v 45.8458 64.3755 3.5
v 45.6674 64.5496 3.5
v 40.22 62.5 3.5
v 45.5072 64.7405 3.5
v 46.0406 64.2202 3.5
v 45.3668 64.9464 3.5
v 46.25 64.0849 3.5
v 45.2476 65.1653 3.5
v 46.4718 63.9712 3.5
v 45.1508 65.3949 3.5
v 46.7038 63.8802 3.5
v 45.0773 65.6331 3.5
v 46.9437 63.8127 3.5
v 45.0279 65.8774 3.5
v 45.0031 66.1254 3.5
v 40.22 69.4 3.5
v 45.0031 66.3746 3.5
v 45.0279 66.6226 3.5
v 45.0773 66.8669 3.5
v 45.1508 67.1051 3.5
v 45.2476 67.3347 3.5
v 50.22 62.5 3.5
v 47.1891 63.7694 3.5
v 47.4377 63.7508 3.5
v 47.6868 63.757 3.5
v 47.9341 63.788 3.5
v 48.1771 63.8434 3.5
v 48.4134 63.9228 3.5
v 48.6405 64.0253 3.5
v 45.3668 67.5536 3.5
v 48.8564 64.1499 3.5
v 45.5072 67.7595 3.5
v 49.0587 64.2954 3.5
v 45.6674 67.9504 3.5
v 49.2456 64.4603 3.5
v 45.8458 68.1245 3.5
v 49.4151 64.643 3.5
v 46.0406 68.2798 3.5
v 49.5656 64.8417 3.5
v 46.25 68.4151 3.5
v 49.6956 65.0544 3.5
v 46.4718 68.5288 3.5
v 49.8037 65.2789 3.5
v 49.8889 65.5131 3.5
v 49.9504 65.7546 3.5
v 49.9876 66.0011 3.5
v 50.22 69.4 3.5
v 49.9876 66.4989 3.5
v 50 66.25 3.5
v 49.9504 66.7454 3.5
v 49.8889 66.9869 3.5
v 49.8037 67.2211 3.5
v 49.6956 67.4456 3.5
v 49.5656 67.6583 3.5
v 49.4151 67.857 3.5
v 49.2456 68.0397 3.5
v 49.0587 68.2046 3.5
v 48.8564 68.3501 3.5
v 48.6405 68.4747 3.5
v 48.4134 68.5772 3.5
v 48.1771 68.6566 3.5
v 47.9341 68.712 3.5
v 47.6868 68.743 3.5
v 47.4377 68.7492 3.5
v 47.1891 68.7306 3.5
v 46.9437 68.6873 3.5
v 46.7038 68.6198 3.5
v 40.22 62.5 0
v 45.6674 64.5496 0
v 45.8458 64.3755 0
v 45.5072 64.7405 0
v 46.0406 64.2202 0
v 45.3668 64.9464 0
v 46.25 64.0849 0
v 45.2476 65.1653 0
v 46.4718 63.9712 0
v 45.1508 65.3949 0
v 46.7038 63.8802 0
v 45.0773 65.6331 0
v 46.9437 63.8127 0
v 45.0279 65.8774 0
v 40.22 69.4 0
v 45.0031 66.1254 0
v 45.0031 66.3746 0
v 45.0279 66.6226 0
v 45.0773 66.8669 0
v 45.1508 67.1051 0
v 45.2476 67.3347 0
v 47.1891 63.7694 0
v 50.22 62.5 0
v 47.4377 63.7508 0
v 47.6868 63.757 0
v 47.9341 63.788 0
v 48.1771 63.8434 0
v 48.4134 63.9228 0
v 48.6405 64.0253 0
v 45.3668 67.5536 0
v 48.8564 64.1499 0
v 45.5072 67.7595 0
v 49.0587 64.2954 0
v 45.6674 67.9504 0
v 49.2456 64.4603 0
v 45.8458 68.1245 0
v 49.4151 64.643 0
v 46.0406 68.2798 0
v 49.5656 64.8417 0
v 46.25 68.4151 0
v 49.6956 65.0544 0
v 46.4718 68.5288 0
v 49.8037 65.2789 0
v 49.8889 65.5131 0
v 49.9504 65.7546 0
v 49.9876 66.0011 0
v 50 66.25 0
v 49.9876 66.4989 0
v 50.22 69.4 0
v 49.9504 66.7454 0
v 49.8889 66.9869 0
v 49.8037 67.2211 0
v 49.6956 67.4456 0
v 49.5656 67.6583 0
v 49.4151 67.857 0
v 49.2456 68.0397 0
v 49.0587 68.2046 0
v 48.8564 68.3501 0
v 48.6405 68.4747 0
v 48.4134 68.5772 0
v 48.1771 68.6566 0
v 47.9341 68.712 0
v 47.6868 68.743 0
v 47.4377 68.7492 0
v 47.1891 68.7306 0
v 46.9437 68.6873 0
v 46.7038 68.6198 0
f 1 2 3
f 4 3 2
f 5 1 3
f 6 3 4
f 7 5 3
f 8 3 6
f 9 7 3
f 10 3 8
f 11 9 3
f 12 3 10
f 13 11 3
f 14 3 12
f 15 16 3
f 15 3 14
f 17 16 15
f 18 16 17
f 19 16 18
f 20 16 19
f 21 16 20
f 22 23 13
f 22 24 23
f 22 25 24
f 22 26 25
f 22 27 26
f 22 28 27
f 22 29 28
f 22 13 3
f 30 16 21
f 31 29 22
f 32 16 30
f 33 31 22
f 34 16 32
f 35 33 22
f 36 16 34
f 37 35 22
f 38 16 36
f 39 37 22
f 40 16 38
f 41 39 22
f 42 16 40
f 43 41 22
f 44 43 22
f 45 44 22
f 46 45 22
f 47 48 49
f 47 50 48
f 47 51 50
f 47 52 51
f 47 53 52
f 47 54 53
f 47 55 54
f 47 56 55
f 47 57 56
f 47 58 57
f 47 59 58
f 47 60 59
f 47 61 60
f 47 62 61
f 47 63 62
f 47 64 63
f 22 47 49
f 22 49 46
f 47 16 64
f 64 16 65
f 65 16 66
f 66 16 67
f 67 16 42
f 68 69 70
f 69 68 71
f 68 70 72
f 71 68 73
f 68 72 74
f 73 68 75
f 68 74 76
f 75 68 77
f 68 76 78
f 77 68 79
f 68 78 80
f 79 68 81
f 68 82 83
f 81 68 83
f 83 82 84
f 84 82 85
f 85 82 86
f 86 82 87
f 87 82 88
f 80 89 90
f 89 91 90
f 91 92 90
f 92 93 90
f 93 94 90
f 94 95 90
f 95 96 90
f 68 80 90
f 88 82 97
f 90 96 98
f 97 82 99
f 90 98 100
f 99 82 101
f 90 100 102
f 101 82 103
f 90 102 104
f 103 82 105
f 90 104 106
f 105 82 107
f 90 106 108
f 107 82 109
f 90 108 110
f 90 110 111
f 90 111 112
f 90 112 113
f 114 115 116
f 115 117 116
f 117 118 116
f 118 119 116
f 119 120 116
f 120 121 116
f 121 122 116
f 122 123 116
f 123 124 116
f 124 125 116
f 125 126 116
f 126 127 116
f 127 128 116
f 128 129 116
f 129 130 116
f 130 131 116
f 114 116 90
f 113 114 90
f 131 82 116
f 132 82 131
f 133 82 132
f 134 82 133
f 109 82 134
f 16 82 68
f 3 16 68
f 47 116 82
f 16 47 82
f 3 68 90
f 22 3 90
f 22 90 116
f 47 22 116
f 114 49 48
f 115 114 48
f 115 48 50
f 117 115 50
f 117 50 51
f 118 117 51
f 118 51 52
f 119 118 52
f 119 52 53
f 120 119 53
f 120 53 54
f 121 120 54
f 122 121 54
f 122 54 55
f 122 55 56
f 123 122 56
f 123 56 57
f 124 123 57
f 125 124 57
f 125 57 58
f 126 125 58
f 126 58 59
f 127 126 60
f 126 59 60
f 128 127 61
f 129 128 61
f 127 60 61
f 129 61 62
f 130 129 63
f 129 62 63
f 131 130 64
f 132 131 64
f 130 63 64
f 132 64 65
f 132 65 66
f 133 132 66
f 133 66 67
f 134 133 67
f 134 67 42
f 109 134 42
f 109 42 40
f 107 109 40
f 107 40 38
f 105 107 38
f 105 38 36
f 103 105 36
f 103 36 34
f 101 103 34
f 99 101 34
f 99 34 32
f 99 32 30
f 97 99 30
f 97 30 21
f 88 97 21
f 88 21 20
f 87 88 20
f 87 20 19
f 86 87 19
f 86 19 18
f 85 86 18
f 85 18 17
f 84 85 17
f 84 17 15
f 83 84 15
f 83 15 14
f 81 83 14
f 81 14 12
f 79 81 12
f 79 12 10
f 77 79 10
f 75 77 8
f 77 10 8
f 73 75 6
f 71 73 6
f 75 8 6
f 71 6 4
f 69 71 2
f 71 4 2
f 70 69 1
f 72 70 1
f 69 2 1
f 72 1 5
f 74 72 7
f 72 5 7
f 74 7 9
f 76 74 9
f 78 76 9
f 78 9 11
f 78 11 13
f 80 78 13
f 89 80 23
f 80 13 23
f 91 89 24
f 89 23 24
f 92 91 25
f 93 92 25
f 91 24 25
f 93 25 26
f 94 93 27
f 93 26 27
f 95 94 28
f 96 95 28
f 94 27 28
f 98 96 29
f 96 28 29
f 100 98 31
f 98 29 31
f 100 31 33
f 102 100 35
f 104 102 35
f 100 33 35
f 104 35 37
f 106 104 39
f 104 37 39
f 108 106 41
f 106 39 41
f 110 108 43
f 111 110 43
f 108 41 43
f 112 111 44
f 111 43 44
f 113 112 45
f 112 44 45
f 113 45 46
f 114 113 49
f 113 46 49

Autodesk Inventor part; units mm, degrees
ref_plane "YZ Plane" through (0, 0, 0) normal (1, 0, 0) x (0, 1, 0)
ref_plane "XZ Plane" through (0, 0, 0) normal (0, 1, 0) x (-1, 0, 0)
ref_plane "XY Plane" through (0, 0, 0) normal (0, 0, 1) x (1, 0, 0)
sketch "Sketch1" plane through (0, 0, 0) normal (0, 0, 1) x (1, 0, 0)
  circle A0 centre (47.5, 66.25) radius 1.5 projected
  line L0 (50.22, 62.5) -> (-50.22, 62.5) construction
  line L1 (50.22, 62.5) -> (50.22, 69.4) construction
  line L2 (50.22, 69.4) -> (-50.22, 69.4) construction
  line L3 (50.22, 69.4) -> (40.22, 69.4)
  line L4 (40.22, 69.4) -> (40.22, 62.5)
  line L5 (40.22, 62.5) -> (50.22, 62.5)
  line L6 (50.22, 62.5) -> (50.22, 69.4)
  point P0 (0, 0)
  dimension "d0" = 10
extrude "Extrusion1" add sketch "Sketch1" along normal blind 3.5
sketch "Sketch2" plane through (0, 0, 3.5) normal (0, 0, 1) x (1, 0, 0)
  circle A0 centre (47.5, 66.25) radius 1.5 projected
  circle A1 centre (47.5, 66.25) radius 2.5
  point P0 (0, 0)
  dimension "d3" = 1
extrude "Extrusion2" cut sketch "Sketch2" against normal through all
properties part number "Screen_Spacers"
